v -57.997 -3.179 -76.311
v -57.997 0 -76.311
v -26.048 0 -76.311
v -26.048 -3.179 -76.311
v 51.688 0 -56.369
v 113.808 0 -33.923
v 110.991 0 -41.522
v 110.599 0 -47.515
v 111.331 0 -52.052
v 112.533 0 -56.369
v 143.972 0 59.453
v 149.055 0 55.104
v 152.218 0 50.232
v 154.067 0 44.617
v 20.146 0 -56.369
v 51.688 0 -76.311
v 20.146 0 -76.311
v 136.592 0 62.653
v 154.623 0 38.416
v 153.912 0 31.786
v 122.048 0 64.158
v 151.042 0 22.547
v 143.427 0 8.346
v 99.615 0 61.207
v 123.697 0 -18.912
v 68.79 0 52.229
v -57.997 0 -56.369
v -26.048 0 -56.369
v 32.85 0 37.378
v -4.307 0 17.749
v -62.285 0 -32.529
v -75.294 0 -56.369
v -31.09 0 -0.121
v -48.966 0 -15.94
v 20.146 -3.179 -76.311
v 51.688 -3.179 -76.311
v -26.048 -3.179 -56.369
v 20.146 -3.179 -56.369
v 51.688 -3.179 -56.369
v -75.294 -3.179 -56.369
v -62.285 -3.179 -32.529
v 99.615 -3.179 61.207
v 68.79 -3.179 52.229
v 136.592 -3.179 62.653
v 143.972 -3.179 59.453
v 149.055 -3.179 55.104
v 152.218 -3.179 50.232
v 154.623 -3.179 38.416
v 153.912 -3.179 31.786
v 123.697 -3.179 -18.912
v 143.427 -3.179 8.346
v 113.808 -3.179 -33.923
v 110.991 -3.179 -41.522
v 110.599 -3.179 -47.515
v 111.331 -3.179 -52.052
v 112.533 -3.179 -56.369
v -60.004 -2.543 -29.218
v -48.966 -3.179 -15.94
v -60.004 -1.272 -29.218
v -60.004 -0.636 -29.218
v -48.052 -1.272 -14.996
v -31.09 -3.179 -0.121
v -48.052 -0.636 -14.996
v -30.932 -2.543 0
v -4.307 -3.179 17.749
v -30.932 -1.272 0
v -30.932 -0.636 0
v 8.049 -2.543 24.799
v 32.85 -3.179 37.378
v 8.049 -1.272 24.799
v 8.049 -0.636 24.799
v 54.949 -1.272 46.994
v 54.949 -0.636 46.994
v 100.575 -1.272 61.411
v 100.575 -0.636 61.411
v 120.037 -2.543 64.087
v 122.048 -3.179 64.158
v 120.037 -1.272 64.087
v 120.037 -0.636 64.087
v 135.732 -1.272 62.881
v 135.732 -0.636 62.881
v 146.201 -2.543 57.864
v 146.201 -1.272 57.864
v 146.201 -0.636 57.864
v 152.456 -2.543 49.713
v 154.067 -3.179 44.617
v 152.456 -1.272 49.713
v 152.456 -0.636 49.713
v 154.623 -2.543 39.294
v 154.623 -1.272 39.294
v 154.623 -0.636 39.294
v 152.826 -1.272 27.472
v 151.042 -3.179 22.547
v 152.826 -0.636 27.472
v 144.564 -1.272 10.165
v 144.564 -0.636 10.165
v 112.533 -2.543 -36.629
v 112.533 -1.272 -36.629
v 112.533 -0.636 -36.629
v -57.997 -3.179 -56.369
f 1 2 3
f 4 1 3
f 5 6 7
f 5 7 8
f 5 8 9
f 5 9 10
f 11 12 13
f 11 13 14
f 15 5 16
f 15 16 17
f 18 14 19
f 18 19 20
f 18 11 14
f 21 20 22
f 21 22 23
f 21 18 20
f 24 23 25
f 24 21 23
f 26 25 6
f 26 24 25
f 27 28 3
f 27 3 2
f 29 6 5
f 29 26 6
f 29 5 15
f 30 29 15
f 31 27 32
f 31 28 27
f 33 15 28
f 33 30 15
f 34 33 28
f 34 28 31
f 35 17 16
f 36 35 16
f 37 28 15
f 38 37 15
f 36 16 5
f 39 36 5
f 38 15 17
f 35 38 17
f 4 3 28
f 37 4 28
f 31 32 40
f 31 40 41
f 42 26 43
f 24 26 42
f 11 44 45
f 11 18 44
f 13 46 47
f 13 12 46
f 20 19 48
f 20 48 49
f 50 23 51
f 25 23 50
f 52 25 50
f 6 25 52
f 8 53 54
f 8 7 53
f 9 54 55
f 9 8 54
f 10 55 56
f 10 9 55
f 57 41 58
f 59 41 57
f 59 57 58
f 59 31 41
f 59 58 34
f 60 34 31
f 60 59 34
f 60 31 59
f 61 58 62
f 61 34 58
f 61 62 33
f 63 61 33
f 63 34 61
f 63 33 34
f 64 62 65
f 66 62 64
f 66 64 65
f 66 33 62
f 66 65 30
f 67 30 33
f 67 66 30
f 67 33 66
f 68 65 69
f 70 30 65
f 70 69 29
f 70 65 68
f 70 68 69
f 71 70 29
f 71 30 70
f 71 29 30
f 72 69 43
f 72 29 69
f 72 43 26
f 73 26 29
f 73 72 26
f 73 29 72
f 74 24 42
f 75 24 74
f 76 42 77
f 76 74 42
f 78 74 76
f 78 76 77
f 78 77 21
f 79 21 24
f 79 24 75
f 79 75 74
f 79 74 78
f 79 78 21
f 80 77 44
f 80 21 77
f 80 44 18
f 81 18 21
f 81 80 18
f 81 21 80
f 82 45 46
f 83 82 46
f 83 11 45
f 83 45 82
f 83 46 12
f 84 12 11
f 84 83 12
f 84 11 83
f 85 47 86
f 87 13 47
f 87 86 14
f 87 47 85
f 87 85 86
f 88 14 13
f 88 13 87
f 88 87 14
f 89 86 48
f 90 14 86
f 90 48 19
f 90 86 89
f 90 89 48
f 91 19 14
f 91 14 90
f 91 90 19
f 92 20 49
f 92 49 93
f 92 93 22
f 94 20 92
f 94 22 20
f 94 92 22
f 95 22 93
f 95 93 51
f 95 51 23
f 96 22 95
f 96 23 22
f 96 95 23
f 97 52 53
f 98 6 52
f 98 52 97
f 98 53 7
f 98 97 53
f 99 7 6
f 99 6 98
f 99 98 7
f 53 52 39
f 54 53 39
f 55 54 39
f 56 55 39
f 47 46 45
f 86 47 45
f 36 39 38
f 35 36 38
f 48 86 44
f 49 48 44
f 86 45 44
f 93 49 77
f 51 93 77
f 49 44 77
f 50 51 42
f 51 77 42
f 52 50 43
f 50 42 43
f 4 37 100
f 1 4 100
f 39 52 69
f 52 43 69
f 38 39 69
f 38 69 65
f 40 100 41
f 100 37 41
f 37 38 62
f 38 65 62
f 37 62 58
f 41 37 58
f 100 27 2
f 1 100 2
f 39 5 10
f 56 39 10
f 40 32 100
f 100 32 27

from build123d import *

# Parameters (mm, degrees)
F1_DEPTH = 3.1792204827


with BuildPart() as f1:
    # F0 (on Front) → F1 (new body)
    with BuildSketch(Plane.XZ):
        with BuildLine():
            add(Edge.make_bspline(
                [(-75.2943009138, -56.3686490059), (-66.6324711802, -38.4976097954), (-44.3209020412, 7.5355012309), (141.3795574006, 90.3375353659), (165.0946965175, 23.1374477041), (105.7016720437, -33.5342675022), (110.8075686828, -50.6001397281), (112.5333309174, -56.3686490059)],
                knots=[0, 0, 0, 0, 0.2054162082, 0.5291212594, 0.6812034053, 0.8922433787, 1, 1, 1, 1], degree=3))
            Line((-75.2943009138, -56.3686490059), (-57.9970628023, -56.3686490059))
            Line((-57.9970628023, -56.3686490059), (-57.9970628023, -76.3113349676))
            Line((-57.9970628023, -76.3113349676), (-26.0480493307, -76.3113349676))
            Line((-26.0480493307, -76.3113349676), (-26.0480493307, -56.3686490059))
            Line((-26.0480493307, -56.3686490059), (20.1457440853, -56.3686490059))
            Line((20.1457440853, -56.3686490059), (20.1457440853, -76.3113349676))
            Line((20.1457440853, -76.3113349676), (51.6877770424, -76.3113349676))
            Line((51.6877770424, -76.3113349676), (51.6877770424, -56.3686490059))
            Line((51.6877770424, -56.3686490059), (112.5333309174, -56.3686490059))
        make_face()
    extrude(amount=F1_DEPTH)


solid = f1.part
